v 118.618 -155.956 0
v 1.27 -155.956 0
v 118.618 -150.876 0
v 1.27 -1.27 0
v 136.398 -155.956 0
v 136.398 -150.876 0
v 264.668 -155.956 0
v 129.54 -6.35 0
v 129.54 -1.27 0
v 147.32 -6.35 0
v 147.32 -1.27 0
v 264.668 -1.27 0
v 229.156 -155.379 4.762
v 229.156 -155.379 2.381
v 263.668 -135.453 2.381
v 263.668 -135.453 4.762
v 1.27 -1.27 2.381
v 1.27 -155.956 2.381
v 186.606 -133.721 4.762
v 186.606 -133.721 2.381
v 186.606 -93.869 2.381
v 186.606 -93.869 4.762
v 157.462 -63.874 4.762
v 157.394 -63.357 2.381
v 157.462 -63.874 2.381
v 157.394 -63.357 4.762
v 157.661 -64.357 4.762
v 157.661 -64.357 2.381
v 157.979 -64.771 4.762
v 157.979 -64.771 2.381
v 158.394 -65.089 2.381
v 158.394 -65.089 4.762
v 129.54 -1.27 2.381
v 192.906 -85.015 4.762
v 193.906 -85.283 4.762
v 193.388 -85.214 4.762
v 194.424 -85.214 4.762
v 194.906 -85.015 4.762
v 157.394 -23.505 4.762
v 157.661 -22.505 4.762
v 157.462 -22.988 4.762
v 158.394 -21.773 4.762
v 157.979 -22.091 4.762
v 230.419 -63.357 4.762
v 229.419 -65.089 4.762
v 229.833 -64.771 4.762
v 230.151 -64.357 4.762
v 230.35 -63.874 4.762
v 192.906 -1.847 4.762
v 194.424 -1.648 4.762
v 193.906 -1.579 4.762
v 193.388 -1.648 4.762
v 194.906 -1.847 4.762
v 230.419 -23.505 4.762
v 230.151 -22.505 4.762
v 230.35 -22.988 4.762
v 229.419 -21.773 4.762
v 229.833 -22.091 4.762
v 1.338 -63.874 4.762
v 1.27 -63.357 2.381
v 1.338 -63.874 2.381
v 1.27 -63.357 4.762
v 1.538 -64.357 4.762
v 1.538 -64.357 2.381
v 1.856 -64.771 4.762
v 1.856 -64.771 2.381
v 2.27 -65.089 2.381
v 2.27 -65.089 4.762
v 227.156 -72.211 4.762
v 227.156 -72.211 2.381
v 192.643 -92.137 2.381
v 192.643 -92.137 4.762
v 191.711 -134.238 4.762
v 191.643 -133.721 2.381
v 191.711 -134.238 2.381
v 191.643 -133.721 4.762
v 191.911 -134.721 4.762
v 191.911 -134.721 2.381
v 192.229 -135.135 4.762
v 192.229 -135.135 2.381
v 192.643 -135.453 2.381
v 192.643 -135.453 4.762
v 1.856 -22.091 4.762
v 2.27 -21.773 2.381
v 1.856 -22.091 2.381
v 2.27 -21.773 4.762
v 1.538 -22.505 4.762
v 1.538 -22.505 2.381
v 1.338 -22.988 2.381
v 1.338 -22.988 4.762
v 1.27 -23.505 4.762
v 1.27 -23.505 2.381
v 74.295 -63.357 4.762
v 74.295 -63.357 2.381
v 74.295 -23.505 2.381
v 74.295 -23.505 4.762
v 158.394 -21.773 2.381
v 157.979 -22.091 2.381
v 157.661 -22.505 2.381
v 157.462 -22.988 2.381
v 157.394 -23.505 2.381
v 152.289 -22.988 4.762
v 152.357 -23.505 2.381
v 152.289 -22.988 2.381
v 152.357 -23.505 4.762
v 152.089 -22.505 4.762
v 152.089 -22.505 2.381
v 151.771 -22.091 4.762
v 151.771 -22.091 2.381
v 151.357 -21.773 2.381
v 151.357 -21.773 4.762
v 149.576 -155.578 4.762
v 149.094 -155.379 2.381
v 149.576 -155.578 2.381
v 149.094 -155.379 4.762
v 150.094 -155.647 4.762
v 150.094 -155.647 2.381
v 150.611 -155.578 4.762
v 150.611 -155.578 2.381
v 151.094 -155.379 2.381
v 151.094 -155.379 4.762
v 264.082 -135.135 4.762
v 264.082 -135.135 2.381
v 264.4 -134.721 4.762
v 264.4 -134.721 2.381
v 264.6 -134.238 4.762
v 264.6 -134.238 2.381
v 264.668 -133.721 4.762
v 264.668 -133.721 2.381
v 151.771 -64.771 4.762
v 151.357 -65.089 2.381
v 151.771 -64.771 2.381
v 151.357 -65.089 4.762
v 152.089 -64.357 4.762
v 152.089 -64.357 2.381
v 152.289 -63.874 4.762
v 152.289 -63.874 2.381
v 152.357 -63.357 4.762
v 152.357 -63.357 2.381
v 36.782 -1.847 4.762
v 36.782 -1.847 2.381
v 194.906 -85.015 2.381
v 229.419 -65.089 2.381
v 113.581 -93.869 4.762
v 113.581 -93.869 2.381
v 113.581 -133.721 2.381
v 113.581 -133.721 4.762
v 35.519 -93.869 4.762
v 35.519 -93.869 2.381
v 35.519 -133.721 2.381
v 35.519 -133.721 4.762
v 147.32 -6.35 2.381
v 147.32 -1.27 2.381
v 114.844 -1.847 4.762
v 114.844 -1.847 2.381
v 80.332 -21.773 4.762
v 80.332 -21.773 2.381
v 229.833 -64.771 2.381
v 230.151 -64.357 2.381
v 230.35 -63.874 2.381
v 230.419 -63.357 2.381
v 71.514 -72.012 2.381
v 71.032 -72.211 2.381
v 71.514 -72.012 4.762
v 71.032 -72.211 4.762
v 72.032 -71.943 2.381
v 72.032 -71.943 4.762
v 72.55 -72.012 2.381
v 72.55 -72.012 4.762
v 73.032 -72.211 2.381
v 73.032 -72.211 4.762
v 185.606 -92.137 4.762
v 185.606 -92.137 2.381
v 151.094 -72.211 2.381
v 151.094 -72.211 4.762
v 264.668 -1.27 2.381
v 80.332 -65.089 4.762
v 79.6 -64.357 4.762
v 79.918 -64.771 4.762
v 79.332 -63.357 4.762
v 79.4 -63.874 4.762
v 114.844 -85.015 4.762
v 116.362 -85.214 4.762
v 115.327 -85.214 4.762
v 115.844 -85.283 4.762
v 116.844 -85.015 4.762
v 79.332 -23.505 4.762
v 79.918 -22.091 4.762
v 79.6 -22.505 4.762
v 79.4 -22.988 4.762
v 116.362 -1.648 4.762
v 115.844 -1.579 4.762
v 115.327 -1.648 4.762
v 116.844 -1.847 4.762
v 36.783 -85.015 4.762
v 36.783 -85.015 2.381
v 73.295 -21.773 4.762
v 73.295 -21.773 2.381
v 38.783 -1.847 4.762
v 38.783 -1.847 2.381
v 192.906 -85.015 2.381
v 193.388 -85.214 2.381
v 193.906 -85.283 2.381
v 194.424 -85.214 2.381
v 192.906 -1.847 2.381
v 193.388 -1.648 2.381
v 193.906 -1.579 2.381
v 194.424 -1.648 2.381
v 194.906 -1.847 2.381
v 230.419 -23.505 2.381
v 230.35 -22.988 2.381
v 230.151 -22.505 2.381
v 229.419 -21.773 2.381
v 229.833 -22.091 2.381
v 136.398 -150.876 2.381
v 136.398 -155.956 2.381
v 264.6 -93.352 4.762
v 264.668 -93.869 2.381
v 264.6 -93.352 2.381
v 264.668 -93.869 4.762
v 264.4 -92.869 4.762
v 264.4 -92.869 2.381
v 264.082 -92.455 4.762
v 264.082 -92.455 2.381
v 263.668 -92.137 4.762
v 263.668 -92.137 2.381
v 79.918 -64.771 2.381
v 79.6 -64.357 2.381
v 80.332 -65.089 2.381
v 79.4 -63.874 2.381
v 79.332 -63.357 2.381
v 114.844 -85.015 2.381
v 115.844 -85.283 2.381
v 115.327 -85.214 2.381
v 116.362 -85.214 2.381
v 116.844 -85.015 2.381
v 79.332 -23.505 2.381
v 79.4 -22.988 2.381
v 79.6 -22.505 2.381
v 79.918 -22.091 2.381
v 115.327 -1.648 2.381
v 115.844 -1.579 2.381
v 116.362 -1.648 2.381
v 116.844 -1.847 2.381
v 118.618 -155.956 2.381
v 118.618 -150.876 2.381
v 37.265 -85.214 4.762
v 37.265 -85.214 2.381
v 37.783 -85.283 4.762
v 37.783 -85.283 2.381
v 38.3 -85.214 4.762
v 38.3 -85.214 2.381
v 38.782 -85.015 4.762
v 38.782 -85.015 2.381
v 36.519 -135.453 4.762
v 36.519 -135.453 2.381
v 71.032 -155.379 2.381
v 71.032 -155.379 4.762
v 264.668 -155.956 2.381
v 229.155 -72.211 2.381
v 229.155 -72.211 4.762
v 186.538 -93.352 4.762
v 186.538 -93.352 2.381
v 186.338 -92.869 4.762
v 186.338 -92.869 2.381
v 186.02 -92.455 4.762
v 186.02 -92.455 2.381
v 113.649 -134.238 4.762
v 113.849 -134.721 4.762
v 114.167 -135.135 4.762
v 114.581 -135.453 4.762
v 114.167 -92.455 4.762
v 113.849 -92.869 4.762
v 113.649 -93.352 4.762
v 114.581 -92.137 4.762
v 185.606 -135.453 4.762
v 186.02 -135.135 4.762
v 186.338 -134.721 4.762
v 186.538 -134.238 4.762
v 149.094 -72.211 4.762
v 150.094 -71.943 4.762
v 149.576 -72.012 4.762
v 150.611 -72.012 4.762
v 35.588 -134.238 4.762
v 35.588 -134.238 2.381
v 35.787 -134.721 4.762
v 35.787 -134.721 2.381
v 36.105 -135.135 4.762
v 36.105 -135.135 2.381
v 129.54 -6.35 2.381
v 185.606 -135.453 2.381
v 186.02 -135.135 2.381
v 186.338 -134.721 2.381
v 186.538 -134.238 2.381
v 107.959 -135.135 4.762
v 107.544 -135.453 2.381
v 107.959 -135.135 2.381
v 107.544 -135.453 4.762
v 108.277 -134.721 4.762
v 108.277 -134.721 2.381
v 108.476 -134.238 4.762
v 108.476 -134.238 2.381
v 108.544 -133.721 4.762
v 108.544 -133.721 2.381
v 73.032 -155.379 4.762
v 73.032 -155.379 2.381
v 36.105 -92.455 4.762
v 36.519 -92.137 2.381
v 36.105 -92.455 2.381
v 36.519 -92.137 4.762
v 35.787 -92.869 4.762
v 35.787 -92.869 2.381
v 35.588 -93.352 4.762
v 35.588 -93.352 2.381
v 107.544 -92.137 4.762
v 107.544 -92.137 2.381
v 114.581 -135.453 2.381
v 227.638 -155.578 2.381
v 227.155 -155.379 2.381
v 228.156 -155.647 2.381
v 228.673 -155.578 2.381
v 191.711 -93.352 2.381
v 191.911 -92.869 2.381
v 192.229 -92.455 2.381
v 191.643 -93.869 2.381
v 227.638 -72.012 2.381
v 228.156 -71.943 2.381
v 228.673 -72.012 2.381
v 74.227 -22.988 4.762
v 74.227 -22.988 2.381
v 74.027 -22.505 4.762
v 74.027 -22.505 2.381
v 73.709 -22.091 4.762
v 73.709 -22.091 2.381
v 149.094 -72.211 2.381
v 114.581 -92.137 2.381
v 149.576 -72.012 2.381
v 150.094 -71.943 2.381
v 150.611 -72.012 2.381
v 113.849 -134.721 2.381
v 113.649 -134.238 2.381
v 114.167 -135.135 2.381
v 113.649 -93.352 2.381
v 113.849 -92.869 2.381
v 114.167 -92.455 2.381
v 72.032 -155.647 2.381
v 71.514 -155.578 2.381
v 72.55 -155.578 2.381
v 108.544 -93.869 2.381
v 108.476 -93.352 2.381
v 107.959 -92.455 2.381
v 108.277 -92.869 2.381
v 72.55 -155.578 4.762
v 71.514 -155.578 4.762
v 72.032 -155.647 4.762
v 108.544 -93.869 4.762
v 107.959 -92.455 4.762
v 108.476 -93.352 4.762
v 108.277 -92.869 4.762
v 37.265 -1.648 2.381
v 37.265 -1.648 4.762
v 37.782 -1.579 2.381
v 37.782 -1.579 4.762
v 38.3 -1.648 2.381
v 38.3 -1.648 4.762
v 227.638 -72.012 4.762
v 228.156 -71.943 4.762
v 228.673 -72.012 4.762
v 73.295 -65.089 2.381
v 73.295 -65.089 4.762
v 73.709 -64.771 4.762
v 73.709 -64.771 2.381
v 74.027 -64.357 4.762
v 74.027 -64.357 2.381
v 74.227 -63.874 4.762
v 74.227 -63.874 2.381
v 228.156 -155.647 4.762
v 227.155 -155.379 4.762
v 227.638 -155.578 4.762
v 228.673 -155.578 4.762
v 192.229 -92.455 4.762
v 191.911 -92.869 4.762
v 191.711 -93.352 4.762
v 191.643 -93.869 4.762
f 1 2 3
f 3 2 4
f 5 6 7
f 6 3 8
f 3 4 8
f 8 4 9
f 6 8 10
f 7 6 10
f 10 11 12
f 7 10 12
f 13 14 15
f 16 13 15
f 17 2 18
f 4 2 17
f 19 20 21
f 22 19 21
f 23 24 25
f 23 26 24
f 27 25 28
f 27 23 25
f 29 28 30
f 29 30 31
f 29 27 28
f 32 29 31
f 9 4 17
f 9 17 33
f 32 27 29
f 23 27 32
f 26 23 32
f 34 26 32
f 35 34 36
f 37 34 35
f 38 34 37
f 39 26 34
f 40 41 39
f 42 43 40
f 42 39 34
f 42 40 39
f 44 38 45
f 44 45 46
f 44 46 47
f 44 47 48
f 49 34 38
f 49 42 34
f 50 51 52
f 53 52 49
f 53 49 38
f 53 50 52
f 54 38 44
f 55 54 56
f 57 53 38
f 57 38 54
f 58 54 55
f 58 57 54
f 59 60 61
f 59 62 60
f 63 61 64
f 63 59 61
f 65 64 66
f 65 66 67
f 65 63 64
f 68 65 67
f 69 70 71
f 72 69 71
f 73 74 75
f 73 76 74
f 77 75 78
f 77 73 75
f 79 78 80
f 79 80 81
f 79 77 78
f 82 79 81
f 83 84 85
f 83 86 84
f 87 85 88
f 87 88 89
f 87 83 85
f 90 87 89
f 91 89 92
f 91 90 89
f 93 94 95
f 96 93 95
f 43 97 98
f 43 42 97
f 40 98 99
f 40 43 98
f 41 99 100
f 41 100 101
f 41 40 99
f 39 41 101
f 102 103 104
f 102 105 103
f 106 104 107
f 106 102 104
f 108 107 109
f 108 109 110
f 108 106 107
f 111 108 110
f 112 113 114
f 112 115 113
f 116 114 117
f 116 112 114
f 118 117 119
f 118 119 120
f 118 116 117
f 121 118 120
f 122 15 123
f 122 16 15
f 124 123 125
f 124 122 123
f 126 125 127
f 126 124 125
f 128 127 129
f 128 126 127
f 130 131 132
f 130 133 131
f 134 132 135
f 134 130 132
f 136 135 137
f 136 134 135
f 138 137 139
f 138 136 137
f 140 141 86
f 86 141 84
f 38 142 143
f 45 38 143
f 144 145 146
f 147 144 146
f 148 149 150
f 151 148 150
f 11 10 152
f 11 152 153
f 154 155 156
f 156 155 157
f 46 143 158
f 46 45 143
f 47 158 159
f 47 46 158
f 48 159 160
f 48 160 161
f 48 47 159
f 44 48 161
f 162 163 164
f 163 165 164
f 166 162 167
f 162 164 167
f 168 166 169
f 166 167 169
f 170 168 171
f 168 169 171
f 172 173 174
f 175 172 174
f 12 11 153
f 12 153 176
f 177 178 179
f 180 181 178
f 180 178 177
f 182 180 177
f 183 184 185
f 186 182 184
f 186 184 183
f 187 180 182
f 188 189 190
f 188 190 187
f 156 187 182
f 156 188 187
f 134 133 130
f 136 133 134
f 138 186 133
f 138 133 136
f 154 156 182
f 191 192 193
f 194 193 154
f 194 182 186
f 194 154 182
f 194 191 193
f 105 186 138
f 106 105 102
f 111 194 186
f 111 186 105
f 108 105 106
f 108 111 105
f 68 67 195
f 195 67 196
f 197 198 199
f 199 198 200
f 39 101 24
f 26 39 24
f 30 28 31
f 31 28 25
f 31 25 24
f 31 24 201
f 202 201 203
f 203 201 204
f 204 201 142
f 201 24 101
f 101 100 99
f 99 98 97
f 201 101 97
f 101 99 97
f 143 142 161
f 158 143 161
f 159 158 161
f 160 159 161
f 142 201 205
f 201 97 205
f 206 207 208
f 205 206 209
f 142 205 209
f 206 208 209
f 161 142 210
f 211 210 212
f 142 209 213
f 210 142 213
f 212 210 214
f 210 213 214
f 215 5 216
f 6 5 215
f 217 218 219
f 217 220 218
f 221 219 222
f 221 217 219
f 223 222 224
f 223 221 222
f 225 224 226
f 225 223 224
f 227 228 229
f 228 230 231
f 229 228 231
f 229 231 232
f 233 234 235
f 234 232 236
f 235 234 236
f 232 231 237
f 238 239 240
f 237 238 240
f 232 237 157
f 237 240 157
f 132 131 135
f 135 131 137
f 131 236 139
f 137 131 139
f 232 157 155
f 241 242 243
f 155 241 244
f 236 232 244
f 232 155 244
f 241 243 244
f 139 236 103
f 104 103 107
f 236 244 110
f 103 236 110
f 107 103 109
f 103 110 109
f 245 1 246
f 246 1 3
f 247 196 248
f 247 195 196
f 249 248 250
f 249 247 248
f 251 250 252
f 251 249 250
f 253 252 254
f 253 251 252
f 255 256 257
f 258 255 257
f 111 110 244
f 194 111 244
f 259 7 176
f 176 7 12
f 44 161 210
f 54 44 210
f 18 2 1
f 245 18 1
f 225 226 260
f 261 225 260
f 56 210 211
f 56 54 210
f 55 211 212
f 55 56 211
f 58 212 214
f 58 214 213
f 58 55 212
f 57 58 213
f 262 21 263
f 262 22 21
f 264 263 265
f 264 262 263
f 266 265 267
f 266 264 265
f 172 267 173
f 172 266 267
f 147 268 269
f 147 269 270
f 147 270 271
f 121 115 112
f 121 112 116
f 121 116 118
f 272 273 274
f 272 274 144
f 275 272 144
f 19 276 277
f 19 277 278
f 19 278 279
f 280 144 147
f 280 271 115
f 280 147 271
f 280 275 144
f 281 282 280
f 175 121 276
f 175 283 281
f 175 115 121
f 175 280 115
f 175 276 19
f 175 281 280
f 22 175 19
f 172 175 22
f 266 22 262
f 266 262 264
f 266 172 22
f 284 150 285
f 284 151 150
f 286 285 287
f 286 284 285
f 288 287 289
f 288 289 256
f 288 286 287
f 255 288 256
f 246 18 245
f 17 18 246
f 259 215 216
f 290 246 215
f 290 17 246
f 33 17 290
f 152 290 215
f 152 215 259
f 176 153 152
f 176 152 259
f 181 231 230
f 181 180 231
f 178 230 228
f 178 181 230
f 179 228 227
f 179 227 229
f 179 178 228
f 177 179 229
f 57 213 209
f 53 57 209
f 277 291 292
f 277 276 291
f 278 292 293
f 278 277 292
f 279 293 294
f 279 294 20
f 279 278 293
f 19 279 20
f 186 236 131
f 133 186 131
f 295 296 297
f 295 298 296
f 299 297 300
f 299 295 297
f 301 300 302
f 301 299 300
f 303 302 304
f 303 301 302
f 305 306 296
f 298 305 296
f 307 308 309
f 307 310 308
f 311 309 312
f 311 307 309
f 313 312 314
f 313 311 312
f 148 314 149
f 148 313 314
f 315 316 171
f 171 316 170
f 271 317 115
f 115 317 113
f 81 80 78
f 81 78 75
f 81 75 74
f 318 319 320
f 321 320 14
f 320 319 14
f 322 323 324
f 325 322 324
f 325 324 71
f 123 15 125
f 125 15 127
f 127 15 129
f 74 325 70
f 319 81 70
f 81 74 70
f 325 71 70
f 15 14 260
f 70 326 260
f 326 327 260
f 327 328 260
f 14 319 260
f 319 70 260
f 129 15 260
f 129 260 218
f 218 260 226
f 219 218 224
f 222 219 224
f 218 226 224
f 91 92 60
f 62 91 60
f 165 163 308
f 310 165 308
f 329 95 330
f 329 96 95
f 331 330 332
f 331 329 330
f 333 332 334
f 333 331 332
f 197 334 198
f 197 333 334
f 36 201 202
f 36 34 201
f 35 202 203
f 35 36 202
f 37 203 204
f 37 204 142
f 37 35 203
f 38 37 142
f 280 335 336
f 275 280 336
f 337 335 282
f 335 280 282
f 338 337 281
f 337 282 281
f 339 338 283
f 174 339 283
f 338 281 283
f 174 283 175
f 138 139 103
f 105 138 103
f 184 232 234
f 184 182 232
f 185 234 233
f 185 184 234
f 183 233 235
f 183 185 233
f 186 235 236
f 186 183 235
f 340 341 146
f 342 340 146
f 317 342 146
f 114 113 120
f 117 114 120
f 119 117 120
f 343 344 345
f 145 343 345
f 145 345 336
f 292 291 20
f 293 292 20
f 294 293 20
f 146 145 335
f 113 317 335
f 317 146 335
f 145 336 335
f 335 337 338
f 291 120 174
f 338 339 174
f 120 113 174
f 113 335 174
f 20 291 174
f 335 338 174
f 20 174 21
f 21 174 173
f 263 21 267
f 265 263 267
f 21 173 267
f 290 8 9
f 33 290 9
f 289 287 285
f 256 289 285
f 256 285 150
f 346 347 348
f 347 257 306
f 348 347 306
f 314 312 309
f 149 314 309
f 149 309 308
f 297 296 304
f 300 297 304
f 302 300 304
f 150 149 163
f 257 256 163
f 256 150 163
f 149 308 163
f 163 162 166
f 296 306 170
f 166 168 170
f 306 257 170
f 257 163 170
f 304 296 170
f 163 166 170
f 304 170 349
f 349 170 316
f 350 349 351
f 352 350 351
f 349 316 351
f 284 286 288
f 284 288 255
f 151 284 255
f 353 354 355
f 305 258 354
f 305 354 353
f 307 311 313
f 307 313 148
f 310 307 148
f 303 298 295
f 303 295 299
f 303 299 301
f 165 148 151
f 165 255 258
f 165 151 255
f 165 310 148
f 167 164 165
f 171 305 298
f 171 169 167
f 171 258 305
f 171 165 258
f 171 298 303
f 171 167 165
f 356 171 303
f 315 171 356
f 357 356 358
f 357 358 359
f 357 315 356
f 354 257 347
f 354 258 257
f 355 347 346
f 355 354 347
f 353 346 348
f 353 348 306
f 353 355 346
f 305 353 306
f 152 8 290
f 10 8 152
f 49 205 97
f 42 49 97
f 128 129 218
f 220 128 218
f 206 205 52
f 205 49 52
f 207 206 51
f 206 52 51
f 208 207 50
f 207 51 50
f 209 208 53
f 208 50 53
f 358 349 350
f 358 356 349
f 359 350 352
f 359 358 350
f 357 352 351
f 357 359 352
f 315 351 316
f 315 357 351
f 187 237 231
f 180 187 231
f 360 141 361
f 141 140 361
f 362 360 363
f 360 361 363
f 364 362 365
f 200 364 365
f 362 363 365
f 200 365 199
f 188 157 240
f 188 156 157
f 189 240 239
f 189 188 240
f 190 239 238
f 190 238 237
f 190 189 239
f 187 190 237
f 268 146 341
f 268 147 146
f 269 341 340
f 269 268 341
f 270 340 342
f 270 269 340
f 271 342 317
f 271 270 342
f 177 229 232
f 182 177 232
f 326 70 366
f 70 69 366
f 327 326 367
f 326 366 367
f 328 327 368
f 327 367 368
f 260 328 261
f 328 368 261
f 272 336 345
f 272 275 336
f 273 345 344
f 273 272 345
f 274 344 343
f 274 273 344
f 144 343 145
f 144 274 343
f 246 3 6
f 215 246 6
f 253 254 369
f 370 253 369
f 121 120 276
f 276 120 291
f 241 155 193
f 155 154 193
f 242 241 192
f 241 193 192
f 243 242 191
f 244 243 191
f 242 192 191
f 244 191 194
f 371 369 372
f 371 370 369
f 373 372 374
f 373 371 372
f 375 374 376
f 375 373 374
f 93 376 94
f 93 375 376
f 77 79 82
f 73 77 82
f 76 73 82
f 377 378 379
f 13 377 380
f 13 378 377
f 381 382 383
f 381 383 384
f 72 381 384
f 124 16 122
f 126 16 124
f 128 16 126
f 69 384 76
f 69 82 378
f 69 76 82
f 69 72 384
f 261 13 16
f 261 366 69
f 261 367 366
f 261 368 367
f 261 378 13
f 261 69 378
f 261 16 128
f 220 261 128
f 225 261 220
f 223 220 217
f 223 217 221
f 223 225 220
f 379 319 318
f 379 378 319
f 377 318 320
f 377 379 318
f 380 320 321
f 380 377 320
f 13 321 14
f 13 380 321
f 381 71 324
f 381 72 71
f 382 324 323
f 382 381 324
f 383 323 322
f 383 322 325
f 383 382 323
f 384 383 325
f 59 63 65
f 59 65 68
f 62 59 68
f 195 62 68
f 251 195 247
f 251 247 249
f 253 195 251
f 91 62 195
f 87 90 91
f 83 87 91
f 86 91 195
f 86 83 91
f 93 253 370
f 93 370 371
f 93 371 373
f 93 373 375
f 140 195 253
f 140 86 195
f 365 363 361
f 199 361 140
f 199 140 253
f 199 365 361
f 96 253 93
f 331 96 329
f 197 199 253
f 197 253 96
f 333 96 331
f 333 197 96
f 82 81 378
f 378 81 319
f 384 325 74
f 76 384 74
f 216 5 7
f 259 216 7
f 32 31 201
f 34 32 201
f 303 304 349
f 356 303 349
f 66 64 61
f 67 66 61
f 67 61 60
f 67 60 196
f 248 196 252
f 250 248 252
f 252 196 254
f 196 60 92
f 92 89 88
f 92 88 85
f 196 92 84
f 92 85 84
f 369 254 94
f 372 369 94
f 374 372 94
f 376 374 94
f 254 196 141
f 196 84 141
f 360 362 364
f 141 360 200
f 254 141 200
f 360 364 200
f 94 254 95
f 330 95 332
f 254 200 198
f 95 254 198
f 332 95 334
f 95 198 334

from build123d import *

# Parameters (mm, degrees)
F0_W     = 263.398
F0_H     = 154.686
F1_DEPTH = 2.38125
F3_DEPTH = 2.38125
F2_W     = 17.78
F2_H     = 5.08
F4_R     = 2
F4_2_R   = 2
F4_3_R   = 2
F4_4_R   = 2
F4_5_R   = 2
F4_6_R   = 2
F5_W     = 17.78
F5_H     = 5.08
F6_DEPTH = 4.7635


with BuildPart() as f1:
    # F0 (on Top) → F1 (new body)
    with BuildSketch(Plane.XY):
        with Locations((132.969, -78.613)):
            Rectangle(F0_W, F0_H)
    extrude(amount=F1_DEPTH)


with BuildPart() as f3:
    # F2 (on face) → F3 (new body)
    with BuildSketch(Plane.XY.offset(2.38125)):
        Polygon((37.7825, -1.27), (1.27, -22.3505017038), (1.27, -64.5115051114), (37.7825, -85.5920068151), (74.295, -64.5115051114), (74.295, -22.3505017038), align=None)
    extrude(amount=F3_DEPTH)

    # F4
    f4_edges = [f3.edges().sort_by_distance(p)[0] for p in [
        (37.7825, -85.592007, 3.571875),
        (1.27, -64.511505, 3.571875),
        (74.295, -64.511505, 3.571875),
        (37.7825, -1.27, 3.571875),
        (1.27, -22.350502, 3.571875),
        (74.295, -22.350502, 3.571875),
    ]]
    fillet(f4_edges, radius=F4_R)


with BuildPart() as f3b:
    # F2 (on face) → F3, piece 2 (new body)
    with BuildSketch(Plane.XY.offset(2.38125)):
        Polygon((228.1555, -71.6339931849), (191.643, -92.7144948886), (191.643, -134.8754982962), (228.1555, -155.956), (264.668, -134.8754982962), (264.668, -92.7144948886), align=None)
    extrude(amount=F3_DEPTH)

    # F4#6
    f4_6_edges = [f3b.edges().sort_by_distance(p)[0] for p in [
        (191.643, -134.875498, 3.571875),
        (228.1555, -155.956, 3.571875),
        (264.668, -134.875498, 3.571875),
        (191.643, -92.714495, 3.571875),
        (228.1555, -71.633993, 3.571875),
        (264.668, -92.714495, 3.571875),
    ]]
    fillet(f4_6_edges, radius=F4_6_R)


with BuildPart() as f3c:
    # F2 (on face) → F3, piece 3 (new body)
    with BuildSketch(Plane.XY.offset(2.38125)):
        Polygon((150.0937471951, -71.6339931849), (113.5812471951, -92.7144948886), (113.5812471951, -134.8754982962), (150.0937471951, -155.956), (186.6062471951, -134.8754982962), (186.6062471951, -92.7144948886), align=None)
    extrude(amount=F3_DEPTH)

    # F4#3
    f4_3_edges = [f3c.edges().sort_by_distance(p)[0] for p in [
        (113.581247, -134.875498, 3.571875),
        (150.093747, -155.956, 3.571875),
        (186.606247, -134.875498, 3.571875),
        (113.581247, -92.714495, 3.571875),
        (150.093747, -71.633993, 3.571875),
        (186.606247, -92.714495, 3.571875),
    ]]
    fillet(f4_3_edges, radius=F4_3_R)


with BuildPart() as f3d:
    # F2 (on face) → F3, piece 4 (new body)
    with BuildSketch(Plane.XY.offset(2.38125)):
        Polygon((193.9060056098, -1.27), (157.3935056098, -22.3505017038), (157.3935056098, -64.5115051114), (193.9060056098, -85.5920068151), (230.4185056098, -64.5115051114), (230.4185056098, -22.3505017038), align=None)
    extrude(amount=F3_DEPTH)

    # F4#5
    f4_5_edges = [f3d.edges().sort_by_distance(p)[0] for p in [
        (157.393506, -64.511505, 3.571875),
        (193.906006, -85.592007, 3.571875),
        (230.418506, -64.511505, 3.571875),
        (157.393506, -22.350502, 3.571875),
        (230.418506, -22.350502, 3.571875),
        (193.906006, -1.27, 3.571875),
    ]]
    fillet(f4_5_edges, radius=F4_5_R)


with BuildPart() as f3e:
    # F2 (on face) → F3, piece 5 (new body)
    with BuildSketch(Plane.XY.offset(2.38125)):
        Polygon((72.0319943902, -71.6339931849), (35.5194943902, -92.7144948886), (35.5194943902, -134.8754982962), (72.0319943902, -155.956), (108.5444943902, -134.8754982962), (108.5444943902, -92.7144948886), align=None)
    extrude(amount=F3_DEPTH)

    # F4#2
    f4_2_edges = [f3e.edges().sort_by_distance(p)[0] for p in [
        (35.519494, -134.875498, 3.571875),
        (72.031994, -155.956, 3.571875),
        (108.544494, -134.875498, 3.571875),
        (35.519494, -92.714495, 3.571875),
        (72.031994, -71.633993, 3.571875),
        (108.544494, -92.714495, 3.571875),
    ]]
    fillet(f4_2_edges, radius=F4_2_R)


with BuildPart() as f3f:
    # F2 (on face) → F3, piece 6 (new body)
    with BuildSketch(Plane.XY.offset(2.38125)):
        Polygon((115.8442528049, -1.27), (79.3317528049, -22.3505017038), (79.3317528049, -64.5115051114), (115.8442528049, -85.5920068151), (152.3567528049, -64.5115051114), (152.3567528049, -22.3505017038), align=None)
    extrude(amount=F3_DEPTH)

    # F4#4
    f4_4_edges = [f3f.edges().sort_by_distance(p)[0] for p in [
        (152.356753, -64.511505, 3.571875),
        (79.331753, -64.511505, 3.571875),
        (115.844253, -85.592007, 3.571875),
        (79.331753, -22.350502, 3.571875),
        (115.844253, -1.27, 3.571875),
        (152.356753, -22.350502, 3.571875),
    ]]
    fillet(f4_4_edges, radius=F4_4_R)


with BuildPart() as f3g:
    # F2 (on face) → F3, piece 7 (new body)
    with BuildSketch(Plane.XY.offset(2.38125)):
        with Locations((127.508, -153.416)):
            Rectangle(F2_W, F2_H)
    extrude(amount=F3_DEPTH)


with BuildPart() as f3h:
    # F2 (on face) → F3, piece 8 (new body)
    with BuildSketch(Plane.XY.offset(2.38125)):
        with Locations((138.43, -3.81)):
            Rectangle(F2_W, F2_H)
    extrude(amount=F3_DEPTH)


with BuildPart() as f6_tool:
    # F5 (on face) → F6 (new body, through all)
    with BuildSketch(Plane.XY):
        with Locations((127.508, -153.416)):
            Rectangle(F5_W, F5_H)
        with Locations((138.43, -3.81)):
            Rectangle(F5_W, F5_H)
    extrude(amount=F6_DEPTH)


with BuildPart() as f1_1:
    add(f1.part)

    # F6: cut by f6_tool
    add(f6_tool.part, mode=Mode.SUBTRACT)


with BuildPart() as f3g_1:
    add(f3g.part)

    # F6: cut by f6_tool
    add(f6_tool.part, mode=Mode.SUBTRACT)


with BuildPart() as f3h_1:
    add(f3h.part)

    # F6: cut by f6_tool
    add(f6_tool.part, mode=Mode.SUBTRACT)


solid = Compound([f3.part, f3b.part, f3c.part, f3d.part, f3e.part, f3f.part, f1_1.part])
